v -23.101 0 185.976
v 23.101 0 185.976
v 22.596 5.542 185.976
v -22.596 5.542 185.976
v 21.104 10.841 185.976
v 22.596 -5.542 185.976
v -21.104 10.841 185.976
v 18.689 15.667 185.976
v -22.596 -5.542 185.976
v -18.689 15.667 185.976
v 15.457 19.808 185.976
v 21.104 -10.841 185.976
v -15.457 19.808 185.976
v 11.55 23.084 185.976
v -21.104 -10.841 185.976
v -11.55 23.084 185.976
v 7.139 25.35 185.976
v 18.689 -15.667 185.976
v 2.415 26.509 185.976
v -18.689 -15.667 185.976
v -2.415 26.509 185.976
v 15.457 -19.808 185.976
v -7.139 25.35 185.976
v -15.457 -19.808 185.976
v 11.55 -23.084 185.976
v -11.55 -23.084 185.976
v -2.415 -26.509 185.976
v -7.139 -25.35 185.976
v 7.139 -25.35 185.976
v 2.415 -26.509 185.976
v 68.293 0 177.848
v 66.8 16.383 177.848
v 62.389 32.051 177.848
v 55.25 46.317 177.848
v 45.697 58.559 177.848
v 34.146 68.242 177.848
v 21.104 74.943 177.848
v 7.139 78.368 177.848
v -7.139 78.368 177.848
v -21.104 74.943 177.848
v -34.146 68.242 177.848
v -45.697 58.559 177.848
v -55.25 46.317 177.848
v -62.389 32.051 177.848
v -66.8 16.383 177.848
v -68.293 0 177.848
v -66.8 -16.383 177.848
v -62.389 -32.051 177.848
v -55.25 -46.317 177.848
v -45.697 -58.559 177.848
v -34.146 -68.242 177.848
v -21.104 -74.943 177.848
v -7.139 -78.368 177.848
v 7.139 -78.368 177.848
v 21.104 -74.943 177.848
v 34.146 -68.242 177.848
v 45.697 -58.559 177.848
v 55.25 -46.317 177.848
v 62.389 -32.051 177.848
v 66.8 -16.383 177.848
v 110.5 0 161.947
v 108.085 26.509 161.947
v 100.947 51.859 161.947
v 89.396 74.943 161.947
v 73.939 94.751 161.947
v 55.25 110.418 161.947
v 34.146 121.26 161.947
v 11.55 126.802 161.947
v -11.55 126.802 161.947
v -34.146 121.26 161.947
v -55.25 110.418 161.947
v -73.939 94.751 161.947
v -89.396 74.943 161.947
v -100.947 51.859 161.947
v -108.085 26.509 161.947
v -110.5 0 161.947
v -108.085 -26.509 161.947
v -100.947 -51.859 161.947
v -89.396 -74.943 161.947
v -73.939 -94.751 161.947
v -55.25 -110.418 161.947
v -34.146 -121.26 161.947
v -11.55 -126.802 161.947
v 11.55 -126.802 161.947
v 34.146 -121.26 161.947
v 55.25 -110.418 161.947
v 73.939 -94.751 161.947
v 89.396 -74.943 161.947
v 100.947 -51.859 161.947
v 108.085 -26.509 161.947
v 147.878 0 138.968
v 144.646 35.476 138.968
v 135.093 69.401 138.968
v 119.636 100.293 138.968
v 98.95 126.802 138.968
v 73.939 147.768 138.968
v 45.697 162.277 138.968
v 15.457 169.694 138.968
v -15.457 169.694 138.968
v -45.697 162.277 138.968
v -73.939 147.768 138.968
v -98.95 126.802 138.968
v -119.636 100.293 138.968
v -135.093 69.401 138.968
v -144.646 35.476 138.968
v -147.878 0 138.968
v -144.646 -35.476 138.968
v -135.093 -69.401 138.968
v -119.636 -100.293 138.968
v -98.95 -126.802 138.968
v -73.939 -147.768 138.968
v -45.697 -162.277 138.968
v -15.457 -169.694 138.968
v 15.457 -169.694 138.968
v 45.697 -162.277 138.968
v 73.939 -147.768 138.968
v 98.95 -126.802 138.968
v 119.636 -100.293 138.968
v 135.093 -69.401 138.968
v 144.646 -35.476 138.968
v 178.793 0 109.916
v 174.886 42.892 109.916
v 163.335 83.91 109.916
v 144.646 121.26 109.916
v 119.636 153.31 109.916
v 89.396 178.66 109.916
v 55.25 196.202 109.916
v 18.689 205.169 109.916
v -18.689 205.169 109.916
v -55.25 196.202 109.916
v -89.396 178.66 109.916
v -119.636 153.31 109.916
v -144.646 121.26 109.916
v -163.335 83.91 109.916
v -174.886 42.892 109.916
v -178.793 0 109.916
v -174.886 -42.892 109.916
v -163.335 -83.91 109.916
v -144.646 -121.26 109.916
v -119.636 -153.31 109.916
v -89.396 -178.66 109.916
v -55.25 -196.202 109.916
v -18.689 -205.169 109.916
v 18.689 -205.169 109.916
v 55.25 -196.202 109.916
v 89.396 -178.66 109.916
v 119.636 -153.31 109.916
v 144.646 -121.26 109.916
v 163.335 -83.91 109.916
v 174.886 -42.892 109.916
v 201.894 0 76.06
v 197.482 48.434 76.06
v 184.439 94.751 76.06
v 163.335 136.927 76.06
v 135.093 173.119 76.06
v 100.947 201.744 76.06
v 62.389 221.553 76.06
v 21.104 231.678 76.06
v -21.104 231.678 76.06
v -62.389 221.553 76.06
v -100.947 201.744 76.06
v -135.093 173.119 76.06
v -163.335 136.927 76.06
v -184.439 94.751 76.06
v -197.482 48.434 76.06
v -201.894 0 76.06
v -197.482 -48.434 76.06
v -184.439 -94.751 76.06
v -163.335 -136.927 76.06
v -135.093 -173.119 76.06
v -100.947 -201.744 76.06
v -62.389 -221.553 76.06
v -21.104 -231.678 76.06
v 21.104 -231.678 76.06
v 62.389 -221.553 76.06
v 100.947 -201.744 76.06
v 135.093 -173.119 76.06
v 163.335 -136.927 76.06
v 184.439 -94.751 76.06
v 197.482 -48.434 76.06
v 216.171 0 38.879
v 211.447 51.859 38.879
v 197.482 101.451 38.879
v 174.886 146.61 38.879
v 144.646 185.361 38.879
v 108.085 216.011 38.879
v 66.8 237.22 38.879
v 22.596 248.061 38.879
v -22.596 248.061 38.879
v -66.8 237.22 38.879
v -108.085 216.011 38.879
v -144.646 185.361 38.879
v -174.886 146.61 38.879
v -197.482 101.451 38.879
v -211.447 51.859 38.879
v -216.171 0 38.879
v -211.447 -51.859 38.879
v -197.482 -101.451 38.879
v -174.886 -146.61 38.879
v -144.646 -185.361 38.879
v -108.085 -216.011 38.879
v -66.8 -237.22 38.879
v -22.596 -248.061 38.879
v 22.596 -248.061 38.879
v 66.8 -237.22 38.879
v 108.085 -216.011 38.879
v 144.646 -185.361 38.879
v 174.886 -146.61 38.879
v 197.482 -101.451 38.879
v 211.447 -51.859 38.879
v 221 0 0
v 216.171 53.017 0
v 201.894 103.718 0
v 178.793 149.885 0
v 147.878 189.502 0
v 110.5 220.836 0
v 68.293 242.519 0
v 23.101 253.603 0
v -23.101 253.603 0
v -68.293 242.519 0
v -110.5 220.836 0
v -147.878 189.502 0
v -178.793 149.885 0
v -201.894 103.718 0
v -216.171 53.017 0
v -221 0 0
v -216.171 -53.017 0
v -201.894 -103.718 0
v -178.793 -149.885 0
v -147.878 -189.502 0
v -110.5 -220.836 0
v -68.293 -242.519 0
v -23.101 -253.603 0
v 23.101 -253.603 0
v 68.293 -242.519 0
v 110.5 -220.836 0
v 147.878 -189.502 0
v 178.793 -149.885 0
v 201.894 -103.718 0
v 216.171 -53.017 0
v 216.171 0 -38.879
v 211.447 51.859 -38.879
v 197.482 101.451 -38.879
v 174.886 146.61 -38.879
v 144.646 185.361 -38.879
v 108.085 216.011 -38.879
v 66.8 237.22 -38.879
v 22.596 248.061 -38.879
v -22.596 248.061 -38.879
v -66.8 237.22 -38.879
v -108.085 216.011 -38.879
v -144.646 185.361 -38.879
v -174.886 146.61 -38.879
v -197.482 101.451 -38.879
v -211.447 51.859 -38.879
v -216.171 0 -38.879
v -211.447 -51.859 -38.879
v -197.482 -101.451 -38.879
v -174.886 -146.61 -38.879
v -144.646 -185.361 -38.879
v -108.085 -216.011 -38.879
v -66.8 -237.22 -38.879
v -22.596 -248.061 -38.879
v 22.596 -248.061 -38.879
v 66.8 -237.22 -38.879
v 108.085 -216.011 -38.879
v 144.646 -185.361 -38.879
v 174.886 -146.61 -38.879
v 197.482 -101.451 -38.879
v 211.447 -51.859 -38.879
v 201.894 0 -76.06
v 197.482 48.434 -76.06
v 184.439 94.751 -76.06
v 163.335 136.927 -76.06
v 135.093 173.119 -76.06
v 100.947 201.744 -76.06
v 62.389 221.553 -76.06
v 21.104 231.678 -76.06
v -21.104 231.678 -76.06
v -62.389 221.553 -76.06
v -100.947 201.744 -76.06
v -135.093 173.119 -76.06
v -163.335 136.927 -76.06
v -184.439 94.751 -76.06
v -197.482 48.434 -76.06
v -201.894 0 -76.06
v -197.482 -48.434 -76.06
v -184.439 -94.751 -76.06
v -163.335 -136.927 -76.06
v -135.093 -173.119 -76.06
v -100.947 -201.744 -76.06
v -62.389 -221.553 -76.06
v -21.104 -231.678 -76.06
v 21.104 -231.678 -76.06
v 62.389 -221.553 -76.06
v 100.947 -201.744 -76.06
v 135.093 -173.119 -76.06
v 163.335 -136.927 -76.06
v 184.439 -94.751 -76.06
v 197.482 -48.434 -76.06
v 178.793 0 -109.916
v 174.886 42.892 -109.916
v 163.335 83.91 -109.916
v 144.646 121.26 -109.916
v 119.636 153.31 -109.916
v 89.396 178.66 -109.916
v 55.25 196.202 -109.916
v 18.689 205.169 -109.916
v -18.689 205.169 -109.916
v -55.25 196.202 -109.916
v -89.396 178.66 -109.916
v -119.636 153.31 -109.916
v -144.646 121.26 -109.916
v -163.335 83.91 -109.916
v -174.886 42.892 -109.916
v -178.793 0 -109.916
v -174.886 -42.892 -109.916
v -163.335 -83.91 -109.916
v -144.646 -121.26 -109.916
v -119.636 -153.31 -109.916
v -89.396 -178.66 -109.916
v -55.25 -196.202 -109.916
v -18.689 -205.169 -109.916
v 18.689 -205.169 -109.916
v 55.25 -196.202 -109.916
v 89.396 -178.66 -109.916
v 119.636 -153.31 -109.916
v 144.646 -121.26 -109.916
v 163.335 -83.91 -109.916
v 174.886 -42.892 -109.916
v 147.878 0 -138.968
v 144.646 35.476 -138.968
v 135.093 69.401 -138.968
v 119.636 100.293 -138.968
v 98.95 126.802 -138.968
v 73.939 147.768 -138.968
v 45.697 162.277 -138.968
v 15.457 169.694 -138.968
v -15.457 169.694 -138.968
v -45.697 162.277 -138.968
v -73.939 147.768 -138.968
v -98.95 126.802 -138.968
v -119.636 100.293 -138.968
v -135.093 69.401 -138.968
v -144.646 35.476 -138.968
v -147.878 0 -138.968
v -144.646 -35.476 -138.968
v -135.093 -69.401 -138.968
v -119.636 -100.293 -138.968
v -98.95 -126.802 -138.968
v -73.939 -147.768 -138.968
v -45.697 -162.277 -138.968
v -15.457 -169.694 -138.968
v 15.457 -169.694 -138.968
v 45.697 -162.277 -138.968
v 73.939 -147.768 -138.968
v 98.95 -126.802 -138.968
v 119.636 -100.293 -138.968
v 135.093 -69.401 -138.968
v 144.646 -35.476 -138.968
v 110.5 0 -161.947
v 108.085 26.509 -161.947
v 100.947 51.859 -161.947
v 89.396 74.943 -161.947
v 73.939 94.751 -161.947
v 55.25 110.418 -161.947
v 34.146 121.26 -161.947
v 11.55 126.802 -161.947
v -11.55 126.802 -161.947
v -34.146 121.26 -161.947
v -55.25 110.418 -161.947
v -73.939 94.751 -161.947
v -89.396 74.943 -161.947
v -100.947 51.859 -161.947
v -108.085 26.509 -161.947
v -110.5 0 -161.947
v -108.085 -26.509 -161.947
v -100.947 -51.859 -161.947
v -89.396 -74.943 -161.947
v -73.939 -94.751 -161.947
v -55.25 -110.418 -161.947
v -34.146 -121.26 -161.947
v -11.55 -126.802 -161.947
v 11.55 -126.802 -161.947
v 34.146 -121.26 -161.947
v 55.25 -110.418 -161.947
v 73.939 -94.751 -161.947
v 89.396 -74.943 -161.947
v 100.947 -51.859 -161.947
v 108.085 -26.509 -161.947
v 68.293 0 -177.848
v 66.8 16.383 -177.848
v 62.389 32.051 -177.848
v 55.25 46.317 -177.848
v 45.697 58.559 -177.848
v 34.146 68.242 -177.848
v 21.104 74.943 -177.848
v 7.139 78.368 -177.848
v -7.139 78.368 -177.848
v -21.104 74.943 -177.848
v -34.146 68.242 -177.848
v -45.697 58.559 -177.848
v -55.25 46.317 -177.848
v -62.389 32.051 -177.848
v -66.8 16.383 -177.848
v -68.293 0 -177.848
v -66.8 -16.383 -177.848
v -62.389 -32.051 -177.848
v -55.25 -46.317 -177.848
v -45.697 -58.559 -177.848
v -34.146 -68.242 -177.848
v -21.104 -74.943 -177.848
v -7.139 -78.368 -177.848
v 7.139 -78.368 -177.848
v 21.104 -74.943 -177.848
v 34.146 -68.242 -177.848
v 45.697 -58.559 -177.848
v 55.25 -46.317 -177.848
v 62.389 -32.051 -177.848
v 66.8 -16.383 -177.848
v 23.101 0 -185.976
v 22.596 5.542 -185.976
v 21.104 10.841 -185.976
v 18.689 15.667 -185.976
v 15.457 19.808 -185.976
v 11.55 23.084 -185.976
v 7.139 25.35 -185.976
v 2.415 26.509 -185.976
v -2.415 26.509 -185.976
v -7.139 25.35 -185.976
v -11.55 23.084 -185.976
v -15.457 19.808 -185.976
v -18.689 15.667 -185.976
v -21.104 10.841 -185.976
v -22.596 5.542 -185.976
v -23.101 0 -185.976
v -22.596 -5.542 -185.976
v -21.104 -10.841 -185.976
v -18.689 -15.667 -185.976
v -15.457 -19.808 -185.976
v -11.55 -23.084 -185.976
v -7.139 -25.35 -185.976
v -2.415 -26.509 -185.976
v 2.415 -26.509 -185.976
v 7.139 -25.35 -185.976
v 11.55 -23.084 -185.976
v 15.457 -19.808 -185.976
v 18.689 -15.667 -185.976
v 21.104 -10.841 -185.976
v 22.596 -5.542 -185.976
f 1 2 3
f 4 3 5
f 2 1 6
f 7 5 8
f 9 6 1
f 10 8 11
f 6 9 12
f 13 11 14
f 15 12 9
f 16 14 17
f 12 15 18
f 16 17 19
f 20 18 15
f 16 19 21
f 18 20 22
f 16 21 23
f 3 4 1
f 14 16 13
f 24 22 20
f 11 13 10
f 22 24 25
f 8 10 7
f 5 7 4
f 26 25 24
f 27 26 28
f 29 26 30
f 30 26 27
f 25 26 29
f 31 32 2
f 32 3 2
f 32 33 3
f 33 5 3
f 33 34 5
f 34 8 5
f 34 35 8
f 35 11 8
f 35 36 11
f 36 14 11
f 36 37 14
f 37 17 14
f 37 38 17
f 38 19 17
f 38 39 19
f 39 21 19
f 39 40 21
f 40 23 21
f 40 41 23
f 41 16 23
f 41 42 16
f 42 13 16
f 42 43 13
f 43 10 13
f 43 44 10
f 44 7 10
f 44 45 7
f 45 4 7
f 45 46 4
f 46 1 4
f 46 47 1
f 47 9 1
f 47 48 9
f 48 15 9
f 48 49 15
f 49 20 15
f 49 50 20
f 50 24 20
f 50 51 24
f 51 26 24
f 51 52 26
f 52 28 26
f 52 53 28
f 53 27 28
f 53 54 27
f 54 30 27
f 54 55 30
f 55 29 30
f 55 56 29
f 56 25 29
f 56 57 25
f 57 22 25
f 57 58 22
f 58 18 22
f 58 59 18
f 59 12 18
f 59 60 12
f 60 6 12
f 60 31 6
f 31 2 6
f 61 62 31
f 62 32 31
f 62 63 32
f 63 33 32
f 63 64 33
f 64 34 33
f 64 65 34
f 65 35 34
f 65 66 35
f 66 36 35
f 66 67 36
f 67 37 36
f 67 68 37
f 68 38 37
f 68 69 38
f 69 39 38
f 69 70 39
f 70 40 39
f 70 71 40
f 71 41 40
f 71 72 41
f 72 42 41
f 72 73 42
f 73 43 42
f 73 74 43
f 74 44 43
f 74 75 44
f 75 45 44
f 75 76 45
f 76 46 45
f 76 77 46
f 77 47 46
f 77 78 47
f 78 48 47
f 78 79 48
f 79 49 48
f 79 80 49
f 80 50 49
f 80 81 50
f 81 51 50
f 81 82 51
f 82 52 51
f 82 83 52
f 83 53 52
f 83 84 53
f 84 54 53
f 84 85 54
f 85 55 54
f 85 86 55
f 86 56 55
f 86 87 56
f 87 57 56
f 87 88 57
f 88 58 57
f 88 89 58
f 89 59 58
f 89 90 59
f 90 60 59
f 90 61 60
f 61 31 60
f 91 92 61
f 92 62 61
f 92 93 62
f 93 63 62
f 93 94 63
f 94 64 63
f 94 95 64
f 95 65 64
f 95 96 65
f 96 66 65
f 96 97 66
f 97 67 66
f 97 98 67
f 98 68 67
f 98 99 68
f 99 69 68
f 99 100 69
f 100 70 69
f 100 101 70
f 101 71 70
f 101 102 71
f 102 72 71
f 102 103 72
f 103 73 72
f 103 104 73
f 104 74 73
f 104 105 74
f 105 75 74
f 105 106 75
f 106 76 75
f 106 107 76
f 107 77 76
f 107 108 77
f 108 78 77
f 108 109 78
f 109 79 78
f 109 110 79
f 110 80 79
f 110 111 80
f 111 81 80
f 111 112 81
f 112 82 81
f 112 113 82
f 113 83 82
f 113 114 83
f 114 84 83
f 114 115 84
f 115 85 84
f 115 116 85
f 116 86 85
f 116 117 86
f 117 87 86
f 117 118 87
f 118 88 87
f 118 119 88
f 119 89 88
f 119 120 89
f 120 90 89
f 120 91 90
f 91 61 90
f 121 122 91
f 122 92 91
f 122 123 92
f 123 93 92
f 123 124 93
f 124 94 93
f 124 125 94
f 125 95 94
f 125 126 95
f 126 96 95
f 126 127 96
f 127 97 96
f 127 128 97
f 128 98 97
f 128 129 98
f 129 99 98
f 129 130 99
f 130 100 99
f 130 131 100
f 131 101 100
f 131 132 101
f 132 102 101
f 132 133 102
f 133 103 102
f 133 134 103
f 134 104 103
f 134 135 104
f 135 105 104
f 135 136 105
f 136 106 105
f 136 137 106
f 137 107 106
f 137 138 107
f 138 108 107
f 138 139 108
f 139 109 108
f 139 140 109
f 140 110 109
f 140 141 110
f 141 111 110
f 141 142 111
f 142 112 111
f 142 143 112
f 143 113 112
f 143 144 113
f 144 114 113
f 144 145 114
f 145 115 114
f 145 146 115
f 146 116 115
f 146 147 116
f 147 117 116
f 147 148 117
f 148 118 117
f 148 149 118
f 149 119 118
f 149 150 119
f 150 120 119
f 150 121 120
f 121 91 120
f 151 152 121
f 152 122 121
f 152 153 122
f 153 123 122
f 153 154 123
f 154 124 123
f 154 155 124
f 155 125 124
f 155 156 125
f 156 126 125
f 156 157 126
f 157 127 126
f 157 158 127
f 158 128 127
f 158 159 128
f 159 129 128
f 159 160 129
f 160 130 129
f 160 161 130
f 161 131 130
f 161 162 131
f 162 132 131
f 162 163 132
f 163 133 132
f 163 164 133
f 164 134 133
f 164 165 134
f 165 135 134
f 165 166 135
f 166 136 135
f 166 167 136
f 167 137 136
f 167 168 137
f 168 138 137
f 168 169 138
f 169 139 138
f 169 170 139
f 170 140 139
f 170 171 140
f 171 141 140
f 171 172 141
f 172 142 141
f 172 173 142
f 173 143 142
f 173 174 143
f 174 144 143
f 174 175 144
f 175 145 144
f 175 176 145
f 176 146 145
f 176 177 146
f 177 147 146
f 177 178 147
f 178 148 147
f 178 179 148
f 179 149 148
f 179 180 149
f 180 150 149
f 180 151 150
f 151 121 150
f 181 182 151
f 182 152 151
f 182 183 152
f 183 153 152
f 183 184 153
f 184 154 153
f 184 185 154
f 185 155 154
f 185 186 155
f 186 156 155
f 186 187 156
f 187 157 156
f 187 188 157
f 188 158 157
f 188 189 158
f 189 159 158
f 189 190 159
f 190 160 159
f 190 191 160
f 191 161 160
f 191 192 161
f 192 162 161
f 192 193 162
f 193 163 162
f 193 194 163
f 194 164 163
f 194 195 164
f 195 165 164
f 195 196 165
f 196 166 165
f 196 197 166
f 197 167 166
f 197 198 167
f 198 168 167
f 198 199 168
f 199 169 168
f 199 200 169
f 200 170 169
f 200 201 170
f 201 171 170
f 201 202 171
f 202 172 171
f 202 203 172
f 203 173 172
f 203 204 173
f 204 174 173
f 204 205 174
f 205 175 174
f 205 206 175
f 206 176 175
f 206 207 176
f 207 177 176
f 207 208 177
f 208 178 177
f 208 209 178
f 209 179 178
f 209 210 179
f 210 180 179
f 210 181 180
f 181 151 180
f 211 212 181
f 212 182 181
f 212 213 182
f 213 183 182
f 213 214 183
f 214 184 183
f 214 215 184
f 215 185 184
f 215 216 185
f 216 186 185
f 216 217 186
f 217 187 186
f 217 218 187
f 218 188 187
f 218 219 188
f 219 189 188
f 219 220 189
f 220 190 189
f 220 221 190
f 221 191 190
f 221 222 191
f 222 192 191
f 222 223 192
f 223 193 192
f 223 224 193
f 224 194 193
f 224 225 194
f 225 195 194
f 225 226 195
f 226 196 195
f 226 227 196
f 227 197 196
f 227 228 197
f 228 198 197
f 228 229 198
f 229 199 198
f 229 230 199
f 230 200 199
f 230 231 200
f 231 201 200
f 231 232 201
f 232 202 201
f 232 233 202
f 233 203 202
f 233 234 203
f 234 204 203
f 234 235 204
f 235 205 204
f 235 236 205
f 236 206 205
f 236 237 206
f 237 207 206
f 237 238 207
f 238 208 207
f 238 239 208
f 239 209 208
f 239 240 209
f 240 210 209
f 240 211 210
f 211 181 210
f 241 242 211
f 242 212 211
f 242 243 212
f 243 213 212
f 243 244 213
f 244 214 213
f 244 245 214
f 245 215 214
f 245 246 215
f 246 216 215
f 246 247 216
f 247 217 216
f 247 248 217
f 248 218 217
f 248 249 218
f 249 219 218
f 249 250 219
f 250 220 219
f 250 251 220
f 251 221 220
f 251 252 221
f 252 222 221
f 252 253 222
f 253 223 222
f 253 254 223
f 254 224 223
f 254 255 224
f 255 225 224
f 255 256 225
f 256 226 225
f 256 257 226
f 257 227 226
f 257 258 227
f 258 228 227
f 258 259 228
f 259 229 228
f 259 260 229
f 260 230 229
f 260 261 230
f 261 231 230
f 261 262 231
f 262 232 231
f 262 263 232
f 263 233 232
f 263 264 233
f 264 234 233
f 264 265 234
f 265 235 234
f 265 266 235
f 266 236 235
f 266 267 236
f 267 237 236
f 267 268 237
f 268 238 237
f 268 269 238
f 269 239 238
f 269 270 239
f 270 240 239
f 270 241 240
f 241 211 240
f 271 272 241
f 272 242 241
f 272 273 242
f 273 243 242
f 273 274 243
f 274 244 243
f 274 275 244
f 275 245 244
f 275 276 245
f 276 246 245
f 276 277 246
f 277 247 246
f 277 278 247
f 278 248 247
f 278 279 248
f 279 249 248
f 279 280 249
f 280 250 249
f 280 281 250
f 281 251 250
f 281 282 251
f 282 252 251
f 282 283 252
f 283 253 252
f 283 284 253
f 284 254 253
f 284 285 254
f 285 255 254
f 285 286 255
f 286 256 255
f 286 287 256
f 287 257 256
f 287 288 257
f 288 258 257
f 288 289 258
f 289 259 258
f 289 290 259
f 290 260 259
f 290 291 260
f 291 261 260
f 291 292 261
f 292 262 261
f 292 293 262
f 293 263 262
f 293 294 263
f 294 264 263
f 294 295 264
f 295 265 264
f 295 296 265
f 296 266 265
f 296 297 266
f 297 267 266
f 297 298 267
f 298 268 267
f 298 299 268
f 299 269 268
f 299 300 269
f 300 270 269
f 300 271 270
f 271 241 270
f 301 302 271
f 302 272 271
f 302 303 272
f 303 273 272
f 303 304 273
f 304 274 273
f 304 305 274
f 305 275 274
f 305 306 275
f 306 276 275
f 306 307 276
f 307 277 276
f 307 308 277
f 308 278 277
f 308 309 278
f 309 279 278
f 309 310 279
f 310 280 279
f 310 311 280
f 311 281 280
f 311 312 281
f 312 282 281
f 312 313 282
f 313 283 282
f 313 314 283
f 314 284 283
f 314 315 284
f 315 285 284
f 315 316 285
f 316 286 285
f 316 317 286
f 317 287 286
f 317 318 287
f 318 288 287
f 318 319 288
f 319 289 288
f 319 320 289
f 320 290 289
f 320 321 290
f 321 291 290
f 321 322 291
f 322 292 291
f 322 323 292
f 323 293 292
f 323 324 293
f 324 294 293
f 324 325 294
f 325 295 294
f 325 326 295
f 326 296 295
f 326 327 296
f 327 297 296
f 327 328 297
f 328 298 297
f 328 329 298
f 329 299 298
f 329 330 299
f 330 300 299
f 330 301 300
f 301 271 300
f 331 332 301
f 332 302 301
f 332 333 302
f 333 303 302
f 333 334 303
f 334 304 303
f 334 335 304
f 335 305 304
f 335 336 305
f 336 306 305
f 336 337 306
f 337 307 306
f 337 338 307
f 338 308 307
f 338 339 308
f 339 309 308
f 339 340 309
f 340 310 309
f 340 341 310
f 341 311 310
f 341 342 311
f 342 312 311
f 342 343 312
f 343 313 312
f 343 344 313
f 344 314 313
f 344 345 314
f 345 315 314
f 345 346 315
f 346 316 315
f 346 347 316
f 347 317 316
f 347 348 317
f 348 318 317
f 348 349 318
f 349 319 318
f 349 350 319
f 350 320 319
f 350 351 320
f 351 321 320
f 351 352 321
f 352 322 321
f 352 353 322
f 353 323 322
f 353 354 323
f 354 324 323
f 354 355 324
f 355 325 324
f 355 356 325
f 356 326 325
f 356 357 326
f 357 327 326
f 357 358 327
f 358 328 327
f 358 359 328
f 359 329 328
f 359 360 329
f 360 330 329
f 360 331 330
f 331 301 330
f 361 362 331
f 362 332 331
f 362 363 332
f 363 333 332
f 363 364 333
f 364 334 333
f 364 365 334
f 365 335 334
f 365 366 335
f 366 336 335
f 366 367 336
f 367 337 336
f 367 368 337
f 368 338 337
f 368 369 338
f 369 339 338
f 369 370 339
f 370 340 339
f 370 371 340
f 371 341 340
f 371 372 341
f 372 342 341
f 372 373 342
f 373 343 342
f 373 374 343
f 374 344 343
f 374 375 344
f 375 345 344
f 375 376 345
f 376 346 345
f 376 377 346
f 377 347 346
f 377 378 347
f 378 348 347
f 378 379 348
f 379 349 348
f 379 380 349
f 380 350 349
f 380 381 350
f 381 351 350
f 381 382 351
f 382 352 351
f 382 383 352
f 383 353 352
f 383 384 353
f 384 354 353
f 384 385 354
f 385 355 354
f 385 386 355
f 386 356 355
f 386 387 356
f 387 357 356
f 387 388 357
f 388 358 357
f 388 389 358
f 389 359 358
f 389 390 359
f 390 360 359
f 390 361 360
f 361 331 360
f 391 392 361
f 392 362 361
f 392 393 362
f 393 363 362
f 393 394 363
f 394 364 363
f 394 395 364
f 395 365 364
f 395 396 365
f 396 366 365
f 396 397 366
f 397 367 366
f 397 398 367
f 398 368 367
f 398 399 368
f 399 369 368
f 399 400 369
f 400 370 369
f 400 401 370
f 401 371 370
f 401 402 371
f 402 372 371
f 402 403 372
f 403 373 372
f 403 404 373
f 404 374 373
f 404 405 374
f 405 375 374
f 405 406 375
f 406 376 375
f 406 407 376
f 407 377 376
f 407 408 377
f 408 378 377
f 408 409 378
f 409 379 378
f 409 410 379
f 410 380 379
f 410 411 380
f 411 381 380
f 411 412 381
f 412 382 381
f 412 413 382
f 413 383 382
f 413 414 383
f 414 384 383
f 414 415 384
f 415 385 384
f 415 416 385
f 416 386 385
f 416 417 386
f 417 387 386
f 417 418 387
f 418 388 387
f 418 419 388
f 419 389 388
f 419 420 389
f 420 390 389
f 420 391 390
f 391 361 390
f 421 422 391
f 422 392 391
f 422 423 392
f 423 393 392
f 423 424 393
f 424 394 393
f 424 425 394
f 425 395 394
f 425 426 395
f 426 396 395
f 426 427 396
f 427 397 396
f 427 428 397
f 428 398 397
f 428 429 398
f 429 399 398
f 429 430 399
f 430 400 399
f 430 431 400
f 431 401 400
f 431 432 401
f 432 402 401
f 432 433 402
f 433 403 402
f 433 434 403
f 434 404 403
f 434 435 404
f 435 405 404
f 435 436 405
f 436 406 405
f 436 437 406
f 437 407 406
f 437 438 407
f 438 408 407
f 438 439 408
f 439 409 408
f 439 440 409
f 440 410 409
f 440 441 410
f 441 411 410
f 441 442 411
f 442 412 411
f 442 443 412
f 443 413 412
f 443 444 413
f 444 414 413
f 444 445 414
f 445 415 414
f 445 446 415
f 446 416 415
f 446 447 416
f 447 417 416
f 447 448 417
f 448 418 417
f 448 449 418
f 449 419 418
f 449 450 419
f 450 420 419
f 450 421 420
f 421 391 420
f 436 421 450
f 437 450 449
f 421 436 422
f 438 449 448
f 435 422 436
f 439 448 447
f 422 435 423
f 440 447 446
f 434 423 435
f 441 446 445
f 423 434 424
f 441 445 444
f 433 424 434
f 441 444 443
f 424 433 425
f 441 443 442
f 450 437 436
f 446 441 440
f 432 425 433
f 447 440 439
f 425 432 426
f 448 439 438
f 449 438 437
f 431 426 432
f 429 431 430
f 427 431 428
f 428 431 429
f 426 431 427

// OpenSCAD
// Generated by SolidPython 1.0.1 on 2020-07-29 00:46:51


scale(v = [13, 15, 11]) {
	sphere(r = 17);
}
/***********************************************
*********      SolidPython code:      **********
************************************************
 
# import packages: SolidPython
from solid import *
from solid.utils import *
from itertools import chain, combinations, permutations


class Resize:

    def __init__(self, scad_file):
        self.scad_file = scad_file
        #self.scad_file = import_scad(scad_file)
        # cone/cylinder param:
        self.r1 = 0
        self.r2 = 0
        self.h = 0
        # rectangular prism param:
        self.w = 0
        self.l = 0
        # ellipse param:
        self.r = 0

    # import OpenScad code (file name corresponds to shape)


    # classify shape + parameters
    def assign(self, param1, param2, param3):
        if self.scad_file == 'cone.scad':
            self.r1 = param1
            self.r2 = param2
            self.h = param3
        elif self.scad_file == 'cylinder.scad':
            self.r1 = param1
            self.r2 = param2
            self.h = param3
        elif self.scad_file == 'rectangularPrism.scad':
            self.h = param1
            self.l = param2
            self.w = param3
        else:
            self.r = param1
            self.h = param2

    # resize parameters
    def iterate(self):
        x = range(3, 20, 2)
        i = 1
        if self.scad_file == 'cone.scad':
            tempList = list(permutations(x, 2))
            for temp in tempList:
                param1 = temp[0]
                param2 = temp[1]
                filepath = 'produced_scad_files/' + 'cone' + str(param1) + '_' + str(param2) + '_' + '.scad'
                scad_render_to_file(cylinder(h=param1, r1=param2, r2=0), filepath)

        elif self.scad_file == 'cylinder.scad':
            tempList = list(permutations(x, 3))
            for temp in tempList:
                param1 = temp[0]
                param2 = temp[1]
                filepath = 'produced_scad_files/' + 'cylinder' + str(param1) + '_' + str(param2) + '_' + '.scad'
                scad_render_to_file(cylinder(h=param1, r1=param2, r2=param2), filepath)

        elif self.scad_file == 'rectangularPrism.scad':
            tempList = list(permutations(x, 3))
            for temp in tempList:
                param1 = temp[0]
                param2 = temp[1]
                param3 = temp[2]
                filepath = 'produced_scad_files/' + 'rectangularPrism' + str(param1) + '_' + str(param2) + '_' + str(
                    param3) + '.scad'
                scad_render_to_file(cube(size=(param1, param2, param3)), filepath)

        elif self.scad_file == 'ellipse.scad':
            tempList = list(permutations(x, 4))
            for temp in tempList:
                param1 = temp[0]
                param2 = temp[1]
                param3 = temp[2]
                param4 = temp[3]
                filepath = 'produced_scad_files/' + 'ellipse' + str(param1) + '_' + str(param2) + '_' + str(param3) + '_' + str(param4) + '.scad'
                scad_render_to_file(scale([param1, param2, param3])(sphere(r=param4)), filepath)

    def render_to_scadfile(self):
        scad_render_to_file(scad, 'example.scad') 
 
************************************************/
